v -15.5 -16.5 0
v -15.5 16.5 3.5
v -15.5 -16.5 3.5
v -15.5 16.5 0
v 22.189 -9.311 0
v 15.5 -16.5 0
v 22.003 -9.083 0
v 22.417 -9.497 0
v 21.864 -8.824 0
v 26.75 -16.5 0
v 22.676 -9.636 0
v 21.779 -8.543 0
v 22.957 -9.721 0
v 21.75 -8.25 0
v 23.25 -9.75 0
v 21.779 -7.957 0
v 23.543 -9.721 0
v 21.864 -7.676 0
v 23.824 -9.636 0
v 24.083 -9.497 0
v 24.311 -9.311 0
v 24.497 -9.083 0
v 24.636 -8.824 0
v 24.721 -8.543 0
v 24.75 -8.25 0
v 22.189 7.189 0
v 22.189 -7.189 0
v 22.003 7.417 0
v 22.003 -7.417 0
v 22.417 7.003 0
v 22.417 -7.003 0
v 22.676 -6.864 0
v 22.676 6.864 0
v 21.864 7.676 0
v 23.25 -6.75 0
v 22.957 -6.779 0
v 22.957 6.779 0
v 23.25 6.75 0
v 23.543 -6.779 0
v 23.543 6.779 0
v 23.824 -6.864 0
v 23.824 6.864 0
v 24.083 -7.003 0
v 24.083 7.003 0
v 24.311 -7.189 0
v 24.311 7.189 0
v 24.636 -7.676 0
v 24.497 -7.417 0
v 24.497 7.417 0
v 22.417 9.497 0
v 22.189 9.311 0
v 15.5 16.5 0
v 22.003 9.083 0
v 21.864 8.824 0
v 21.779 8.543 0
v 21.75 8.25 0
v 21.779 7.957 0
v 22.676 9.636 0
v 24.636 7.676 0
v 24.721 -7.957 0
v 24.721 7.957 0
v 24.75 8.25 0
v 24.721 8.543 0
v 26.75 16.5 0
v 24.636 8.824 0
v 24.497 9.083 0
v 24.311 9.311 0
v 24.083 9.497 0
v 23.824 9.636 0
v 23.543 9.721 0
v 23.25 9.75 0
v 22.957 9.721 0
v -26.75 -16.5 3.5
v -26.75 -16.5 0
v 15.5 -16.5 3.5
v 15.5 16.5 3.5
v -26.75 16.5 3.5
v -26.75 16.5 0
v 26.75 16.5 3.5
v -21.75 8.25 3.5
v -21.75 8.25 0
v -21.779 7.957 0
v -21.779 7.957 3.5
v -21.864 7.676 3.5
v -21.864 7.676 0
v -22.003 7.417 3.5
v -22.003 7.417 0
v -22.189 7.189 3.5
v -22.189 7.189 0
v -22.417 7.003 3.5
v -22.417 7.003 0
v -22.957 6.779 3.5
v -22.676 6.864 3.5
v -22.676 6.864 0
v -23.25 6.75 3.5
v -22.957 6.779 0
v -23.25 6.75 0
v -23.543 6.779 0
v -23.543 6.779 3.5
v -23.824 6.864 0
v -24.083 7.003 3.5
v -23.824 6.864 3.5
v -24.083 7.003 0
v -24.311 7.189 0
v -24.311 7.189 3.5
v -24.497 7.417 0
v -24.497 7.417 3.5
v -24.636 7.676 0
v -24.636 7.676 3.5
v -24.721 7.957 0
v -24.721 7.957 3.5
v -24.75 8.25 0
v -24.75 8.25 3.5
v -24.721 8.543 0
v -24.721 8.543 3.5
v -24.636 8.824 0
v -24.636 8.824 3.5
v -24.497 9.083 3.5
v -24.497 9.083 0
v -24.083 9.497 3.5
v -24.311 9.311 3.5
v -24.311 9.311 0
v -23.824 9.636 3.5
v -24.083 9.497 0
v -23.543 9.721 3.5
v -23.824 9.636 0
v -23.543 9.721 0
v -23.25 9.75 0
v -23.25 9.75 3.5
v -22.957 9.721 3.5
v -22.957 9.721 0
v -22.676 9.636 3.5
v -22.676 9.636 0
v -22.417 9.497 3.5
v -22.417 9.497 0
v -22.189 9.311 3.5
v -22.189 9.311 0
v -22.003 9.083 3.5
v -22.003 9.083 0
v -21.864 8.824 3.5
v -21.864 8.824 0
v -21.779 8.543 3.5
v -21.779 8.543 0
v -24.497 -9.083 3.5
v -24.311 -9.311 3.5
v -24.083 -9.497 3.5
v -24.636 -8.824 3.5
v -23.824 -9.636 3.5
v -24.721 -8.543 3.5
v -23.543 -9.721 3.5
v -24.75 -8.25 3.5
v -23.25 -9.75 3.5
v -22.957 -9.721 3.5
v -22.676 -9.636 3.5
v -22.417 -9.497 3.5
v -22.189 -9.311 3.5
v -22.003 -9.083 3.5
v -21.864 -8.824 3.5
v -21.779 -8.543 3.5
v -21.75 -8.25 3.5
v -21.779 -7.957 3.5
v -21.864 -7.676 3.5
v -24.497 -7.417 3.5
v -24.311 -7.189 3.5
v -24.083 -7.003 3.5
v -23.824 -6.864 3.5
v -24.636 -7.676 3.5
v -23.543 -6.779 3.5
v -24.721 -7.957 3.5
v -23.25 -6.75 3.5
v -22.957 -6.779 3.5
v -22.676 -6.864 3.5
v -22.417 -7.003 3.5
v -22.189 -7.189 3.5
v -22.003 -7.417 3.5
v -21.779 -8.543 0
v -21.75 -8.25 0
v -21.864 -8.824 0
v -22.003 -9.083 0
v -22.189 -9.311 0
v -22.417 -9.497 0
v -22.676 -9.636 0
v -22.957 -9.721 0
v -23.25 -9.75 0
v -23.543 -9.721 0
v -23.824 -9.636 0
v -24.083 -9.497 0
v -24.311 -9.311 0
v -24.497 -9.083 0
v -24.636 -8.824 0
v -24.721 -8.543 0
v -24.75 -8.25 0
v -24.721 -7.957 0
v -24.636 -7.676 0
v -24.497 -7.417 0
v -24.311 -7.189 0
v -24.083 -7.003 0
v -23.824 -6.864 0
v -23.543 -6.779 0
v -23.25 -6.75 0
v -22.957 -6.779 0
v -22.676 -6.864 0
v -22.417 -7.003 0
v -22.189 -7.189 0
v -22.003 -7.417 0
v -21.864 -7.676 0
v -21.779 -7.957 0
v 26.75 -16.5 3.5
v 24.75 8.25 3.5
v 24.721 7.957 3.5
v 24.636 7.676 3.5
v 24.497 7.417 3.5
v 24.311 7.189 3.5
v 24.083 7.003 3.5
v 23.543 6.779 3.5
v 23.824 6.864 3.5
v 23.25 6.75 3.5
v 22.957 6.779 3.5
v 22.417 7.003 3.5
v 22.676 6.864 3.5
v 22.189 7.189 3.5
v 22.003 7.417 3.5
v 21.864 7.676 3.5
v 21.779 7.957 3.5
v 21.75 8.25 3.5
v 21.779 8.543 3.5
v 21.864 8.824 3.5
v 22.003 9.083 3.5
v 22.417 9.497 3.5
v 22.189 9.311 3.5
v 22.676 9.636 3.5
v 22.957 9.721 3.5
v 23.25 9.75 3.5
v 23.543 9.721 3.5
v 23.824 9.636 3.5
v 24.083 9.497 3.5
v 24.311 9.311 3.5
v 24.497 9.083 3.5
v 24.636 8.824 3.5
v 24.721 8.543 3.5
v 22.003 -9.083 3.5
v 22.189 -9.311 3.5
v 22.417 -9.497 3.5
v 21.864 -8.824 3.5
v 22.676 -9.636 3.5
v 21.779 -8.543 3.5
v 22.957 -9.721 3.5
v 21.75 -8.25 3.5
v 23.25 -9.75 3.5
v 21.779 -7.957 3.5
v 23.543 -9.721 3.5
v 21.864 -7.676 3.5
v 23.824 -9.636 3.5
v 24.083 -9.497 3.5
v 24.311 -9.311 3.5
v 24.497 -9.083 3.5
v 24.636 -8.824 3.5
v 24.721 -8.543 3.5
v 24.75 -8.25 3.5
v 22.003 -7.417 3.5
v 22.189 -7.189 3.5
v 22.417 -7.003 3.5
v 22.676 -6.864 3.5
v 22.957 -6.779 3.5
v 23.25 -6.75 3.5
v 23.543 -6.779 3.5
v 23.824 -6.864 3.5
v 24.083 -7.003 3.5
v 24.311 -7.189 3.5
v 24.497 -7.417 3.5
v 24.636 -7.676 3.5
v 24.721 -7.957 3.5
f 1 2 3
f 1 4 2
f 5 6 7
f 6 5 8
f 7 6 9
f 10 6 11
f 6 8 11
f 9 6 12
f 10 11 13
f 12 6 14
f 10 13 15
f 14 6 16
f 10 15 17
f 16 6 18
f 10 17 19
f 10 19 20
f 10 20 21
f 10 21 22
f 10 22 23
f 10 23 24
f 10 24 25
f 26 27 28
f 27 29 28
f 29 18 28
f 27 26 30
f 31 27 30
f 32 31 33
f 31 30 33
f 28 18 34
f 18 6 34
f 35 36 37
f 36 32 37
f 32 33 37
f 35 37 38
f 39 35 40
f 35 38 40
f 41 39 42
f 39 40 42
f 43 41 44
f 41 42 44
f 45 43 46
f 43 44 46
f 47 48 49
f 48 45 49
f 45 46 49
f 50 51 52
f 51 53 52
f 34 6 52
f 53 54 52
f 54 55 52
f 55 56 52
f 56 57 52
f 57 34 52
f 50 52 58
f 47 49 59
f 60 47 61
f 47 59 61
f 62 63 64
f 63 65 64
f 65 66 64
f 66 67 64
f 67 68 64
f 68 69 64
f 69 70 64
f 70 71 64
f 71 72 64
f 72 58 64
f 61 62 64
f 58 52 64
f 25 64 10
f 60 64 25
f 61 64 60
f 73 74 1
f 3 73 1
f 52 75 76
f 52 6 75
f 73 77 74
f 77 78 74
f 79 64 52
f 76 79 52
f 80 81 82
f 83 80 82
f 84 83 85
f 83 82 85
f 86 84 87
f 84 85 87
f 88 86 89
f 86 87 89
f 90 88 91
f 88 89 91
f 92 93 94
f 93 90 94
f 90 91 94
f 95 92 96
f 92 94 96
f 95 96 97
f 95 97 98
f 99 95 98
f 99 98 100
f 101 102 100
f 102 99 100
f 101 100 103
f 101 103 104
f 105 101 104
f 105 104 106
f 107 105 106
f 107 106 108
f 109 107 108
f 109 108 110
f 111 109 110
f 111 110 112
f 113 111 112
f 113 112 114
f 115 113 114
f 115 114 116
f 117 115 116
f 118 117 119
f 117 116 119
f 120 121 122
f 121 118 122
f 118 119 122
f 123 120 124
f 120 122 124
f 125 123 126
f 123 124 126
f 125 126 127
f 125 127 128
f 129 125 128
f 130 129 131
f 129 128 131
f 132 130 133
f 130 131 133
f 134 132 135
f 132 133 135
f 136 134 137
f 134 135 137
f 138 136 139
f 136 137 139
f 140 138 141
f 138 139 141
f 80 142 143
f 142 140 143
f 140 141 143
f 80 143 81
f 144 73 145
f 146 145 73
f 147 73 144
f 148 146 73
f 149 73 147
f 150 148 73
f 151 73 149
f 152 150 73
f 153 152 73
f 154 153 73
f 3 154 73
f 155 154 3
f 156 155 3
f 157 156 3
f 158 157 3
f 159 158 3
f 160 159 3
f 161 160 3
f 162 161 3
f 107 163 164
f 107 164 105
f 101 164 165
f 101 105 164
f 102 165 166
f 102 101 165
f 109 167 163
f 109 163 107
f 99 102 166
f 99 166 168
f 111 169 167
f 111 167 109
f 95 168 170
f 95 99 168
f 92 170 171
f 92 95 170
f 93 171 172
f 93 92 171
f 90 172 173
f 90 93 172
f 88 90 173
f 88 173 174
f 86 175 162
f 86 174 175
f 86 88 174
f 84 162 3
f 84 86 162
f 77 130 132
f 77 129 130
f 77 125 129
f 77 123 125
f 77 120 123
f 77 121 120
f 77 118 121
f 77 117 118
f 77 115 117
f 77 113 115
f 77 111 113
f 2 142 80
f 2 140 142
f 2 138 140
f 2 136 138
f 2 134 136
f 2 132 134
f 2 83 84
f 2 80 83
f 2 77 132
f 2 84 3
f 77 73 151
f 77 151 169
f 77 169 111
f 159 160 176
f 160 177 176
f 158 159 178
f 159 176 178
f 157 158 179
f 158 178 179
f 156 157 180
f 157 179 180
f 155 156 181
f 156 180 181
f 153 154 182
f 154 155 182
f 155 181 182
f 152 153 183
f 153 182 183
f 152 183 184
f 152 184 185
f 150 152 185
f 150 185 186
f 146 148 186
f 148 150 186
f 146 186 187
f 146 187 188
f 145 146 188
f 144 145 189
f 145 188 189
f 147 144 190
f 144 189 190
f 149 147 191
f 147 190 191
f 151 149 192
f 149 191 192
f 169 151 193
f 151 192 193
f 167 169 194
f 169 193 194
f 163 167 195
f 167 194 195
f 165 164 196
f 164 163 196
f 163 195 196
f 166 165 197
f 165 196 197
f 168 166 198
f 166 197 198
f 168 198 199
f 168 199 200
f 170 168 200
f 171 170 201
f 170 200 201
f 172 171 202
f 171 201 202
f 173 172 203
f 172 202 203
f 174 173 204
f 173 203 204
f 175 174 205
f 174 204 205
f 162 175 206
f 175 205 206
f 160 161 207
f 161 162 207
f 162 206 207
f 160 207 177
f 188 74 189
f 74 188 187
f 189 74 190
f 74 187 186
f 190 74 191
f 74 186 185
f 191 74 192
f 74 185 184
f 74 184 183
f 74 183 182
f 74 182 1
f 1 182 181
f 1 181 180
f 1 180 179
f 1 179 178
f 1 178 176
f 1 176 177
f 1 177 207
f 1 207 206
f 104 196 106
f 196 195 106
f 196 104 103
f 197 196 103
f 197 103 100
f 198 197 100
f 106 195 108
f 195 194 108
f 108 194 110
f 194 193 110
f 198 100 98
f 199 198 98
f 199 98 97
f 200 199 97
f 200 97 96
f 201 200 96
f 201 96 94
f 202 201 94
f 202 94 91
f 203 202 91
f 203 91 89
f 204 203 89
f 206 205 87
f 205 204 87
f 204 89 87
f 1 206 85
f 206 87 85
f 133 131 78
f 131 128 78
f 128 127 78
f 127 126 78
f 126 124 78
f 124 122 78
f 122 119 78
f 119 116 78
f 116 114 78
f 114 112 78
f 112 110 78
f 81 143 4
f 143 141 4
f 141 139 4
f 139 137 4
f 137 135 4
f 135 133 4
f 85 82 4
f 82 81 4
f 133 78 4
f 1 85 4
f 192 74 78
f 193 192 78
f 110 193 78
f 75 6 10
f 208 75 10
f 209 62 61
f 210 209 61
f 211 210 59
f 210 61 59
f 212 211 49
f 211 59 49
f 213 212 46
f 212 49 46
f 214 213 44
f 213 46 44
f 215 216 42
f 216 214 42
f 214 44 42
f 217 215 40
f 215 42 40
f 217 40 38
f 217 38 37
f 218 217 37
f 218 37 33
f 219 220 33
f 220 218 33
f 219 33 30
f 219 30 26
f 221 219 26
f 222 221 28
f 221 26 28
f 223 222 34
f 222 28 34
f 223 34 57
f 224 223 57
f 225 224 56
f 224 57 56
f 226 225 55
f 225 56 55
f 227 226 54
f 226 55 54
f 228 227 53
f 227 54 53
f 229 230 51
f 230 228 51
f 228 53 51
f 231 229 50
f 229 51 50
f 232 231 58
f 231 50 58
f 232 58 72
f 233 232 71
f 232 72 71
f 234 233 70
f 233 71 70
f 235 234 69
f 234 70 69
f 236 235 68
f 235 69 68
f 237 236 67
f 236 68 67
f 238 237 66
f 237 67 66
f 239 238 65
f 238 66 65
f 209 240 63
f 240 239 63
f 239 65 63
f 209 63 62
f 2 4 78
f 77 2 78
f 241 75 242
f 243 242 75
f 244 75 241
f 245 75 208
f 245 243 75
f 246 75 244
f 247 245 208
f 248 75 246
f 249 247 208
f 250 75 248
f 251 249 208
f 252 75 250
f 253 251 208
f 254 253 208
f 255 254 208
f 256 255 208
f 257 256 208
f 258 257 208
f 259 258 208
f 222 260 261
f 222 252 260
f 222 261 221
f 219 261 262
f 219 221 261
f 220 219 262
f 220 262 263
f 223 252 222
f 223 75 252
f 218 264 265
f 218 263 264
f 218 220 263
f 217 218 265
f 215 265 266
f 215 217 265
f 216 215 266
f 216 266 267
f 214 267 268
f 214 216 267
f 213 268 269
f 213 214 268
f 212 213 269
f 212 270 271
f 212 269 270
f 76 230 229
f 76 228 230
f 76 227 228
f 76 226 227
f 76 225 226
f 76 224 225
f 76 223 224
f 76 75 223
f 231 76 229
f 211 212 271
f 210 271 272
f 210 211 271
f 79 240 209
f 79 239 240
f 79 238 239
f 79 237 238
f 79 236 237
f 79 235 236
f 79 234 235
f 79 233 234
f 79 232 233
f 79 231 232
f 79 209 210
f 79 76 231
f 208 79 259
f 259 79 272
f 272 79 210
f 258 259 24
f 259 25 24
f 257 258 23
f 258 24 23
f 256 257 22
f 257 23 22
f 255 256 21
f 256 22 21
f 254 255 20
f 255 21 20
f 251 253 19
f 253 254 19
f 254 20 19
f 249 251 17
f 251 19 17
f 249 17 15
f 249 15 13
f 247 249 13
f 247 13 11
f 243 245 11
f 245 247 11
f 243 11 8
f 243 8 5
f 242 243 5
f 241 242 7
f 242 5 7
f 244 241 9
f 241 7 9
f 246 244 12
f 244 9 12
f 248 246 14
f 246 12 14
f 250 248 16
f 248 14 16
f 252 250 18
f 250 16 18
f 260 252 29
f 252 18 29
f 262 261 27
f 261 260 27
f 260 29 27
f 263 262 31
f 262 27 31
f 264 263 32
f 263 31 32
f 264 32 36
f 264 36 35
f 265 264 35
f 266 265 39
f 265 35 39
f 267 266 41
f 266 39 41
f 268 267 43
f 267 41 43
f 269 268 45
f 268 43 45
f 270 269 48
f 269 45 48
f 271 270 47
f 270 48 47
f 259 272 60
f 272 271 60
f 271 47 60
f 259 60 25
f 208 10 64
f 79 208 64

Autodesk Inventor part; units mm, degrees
ref_plane "YZ Plane" through (0, 0, 0) normal (1, 0, 0) x (0, 1, 0)
ref_plane "XZ Plane" through (0, 0, 0) normal (0, 1, 0) x (-1, 0, 0)
ref_plane "XY Plane" through (0, 0, 0) normal (0, 0, 1) x (1, 0, 0)
sketch "Skizze1" plane through (0, 0, 0) normal (0, 0, 1) x (1, 0, 0)
  line L0 (-37.45, 0) -> (37.45, 0) construction
  line L1 (0, -23.1) -> (0, 23.1) construction
  line L2 (-26.75, -16.5) -> (26.75, -16.5)
  line L3 (26.75, -16.5) -> (26.75, 16.5)
  line L4 (26.75, 16.5) -> (-26.75, 16.5)
  line L5 (-26.75, 16.5) -> (-26.75, -16.5)
  line L6 (-26.75, -16.5) -> (26.75, 16.5) construction
  line L7 (26.75, -16.5) -> (-26.75, 16.5) construction
  line L8 (-15.5, -16.5) -> (15.5, -16.5)
  line L9 (15.5, -16.5) -> (15.5, 16.5)
  line L10 (15.5, 16.5) -> (-15.5, 16.5)
  line L11 (-15.5, 16.5) -> (-15.5, -16.5)
  line L12 (-15.5, -16.5) -> (15.5, 16.5) construction
  line L13 (15.5, -16.5) -> (-15.5, 16.5) construction
  circle A0 centre (-23.25, -8.25) radius 1.5
  circle A1 centre (23.25, -8.25) radius 1.5
  circle A2 centre (-23.25, 8.25) radius 1.5
  circle A3 centre (23.25, 8.25) radius 1.5
  point P0 (0, 0)
  dimension "d0" = 53.5
  dimension "d1" = 33
  dimension "d2" = 31
  dimension "d3" = 33
  dimension "d6" = 3
  dimension "d9" = 23.25
  dimension "d10" = 8.25
extrude "Extrusion1" add sketch "Skizze1" along normal blind 3.5 contours L5 L4 L11 L2 | L9 L4 L3 L2
properties part number "LC_mirror_holder_back"
